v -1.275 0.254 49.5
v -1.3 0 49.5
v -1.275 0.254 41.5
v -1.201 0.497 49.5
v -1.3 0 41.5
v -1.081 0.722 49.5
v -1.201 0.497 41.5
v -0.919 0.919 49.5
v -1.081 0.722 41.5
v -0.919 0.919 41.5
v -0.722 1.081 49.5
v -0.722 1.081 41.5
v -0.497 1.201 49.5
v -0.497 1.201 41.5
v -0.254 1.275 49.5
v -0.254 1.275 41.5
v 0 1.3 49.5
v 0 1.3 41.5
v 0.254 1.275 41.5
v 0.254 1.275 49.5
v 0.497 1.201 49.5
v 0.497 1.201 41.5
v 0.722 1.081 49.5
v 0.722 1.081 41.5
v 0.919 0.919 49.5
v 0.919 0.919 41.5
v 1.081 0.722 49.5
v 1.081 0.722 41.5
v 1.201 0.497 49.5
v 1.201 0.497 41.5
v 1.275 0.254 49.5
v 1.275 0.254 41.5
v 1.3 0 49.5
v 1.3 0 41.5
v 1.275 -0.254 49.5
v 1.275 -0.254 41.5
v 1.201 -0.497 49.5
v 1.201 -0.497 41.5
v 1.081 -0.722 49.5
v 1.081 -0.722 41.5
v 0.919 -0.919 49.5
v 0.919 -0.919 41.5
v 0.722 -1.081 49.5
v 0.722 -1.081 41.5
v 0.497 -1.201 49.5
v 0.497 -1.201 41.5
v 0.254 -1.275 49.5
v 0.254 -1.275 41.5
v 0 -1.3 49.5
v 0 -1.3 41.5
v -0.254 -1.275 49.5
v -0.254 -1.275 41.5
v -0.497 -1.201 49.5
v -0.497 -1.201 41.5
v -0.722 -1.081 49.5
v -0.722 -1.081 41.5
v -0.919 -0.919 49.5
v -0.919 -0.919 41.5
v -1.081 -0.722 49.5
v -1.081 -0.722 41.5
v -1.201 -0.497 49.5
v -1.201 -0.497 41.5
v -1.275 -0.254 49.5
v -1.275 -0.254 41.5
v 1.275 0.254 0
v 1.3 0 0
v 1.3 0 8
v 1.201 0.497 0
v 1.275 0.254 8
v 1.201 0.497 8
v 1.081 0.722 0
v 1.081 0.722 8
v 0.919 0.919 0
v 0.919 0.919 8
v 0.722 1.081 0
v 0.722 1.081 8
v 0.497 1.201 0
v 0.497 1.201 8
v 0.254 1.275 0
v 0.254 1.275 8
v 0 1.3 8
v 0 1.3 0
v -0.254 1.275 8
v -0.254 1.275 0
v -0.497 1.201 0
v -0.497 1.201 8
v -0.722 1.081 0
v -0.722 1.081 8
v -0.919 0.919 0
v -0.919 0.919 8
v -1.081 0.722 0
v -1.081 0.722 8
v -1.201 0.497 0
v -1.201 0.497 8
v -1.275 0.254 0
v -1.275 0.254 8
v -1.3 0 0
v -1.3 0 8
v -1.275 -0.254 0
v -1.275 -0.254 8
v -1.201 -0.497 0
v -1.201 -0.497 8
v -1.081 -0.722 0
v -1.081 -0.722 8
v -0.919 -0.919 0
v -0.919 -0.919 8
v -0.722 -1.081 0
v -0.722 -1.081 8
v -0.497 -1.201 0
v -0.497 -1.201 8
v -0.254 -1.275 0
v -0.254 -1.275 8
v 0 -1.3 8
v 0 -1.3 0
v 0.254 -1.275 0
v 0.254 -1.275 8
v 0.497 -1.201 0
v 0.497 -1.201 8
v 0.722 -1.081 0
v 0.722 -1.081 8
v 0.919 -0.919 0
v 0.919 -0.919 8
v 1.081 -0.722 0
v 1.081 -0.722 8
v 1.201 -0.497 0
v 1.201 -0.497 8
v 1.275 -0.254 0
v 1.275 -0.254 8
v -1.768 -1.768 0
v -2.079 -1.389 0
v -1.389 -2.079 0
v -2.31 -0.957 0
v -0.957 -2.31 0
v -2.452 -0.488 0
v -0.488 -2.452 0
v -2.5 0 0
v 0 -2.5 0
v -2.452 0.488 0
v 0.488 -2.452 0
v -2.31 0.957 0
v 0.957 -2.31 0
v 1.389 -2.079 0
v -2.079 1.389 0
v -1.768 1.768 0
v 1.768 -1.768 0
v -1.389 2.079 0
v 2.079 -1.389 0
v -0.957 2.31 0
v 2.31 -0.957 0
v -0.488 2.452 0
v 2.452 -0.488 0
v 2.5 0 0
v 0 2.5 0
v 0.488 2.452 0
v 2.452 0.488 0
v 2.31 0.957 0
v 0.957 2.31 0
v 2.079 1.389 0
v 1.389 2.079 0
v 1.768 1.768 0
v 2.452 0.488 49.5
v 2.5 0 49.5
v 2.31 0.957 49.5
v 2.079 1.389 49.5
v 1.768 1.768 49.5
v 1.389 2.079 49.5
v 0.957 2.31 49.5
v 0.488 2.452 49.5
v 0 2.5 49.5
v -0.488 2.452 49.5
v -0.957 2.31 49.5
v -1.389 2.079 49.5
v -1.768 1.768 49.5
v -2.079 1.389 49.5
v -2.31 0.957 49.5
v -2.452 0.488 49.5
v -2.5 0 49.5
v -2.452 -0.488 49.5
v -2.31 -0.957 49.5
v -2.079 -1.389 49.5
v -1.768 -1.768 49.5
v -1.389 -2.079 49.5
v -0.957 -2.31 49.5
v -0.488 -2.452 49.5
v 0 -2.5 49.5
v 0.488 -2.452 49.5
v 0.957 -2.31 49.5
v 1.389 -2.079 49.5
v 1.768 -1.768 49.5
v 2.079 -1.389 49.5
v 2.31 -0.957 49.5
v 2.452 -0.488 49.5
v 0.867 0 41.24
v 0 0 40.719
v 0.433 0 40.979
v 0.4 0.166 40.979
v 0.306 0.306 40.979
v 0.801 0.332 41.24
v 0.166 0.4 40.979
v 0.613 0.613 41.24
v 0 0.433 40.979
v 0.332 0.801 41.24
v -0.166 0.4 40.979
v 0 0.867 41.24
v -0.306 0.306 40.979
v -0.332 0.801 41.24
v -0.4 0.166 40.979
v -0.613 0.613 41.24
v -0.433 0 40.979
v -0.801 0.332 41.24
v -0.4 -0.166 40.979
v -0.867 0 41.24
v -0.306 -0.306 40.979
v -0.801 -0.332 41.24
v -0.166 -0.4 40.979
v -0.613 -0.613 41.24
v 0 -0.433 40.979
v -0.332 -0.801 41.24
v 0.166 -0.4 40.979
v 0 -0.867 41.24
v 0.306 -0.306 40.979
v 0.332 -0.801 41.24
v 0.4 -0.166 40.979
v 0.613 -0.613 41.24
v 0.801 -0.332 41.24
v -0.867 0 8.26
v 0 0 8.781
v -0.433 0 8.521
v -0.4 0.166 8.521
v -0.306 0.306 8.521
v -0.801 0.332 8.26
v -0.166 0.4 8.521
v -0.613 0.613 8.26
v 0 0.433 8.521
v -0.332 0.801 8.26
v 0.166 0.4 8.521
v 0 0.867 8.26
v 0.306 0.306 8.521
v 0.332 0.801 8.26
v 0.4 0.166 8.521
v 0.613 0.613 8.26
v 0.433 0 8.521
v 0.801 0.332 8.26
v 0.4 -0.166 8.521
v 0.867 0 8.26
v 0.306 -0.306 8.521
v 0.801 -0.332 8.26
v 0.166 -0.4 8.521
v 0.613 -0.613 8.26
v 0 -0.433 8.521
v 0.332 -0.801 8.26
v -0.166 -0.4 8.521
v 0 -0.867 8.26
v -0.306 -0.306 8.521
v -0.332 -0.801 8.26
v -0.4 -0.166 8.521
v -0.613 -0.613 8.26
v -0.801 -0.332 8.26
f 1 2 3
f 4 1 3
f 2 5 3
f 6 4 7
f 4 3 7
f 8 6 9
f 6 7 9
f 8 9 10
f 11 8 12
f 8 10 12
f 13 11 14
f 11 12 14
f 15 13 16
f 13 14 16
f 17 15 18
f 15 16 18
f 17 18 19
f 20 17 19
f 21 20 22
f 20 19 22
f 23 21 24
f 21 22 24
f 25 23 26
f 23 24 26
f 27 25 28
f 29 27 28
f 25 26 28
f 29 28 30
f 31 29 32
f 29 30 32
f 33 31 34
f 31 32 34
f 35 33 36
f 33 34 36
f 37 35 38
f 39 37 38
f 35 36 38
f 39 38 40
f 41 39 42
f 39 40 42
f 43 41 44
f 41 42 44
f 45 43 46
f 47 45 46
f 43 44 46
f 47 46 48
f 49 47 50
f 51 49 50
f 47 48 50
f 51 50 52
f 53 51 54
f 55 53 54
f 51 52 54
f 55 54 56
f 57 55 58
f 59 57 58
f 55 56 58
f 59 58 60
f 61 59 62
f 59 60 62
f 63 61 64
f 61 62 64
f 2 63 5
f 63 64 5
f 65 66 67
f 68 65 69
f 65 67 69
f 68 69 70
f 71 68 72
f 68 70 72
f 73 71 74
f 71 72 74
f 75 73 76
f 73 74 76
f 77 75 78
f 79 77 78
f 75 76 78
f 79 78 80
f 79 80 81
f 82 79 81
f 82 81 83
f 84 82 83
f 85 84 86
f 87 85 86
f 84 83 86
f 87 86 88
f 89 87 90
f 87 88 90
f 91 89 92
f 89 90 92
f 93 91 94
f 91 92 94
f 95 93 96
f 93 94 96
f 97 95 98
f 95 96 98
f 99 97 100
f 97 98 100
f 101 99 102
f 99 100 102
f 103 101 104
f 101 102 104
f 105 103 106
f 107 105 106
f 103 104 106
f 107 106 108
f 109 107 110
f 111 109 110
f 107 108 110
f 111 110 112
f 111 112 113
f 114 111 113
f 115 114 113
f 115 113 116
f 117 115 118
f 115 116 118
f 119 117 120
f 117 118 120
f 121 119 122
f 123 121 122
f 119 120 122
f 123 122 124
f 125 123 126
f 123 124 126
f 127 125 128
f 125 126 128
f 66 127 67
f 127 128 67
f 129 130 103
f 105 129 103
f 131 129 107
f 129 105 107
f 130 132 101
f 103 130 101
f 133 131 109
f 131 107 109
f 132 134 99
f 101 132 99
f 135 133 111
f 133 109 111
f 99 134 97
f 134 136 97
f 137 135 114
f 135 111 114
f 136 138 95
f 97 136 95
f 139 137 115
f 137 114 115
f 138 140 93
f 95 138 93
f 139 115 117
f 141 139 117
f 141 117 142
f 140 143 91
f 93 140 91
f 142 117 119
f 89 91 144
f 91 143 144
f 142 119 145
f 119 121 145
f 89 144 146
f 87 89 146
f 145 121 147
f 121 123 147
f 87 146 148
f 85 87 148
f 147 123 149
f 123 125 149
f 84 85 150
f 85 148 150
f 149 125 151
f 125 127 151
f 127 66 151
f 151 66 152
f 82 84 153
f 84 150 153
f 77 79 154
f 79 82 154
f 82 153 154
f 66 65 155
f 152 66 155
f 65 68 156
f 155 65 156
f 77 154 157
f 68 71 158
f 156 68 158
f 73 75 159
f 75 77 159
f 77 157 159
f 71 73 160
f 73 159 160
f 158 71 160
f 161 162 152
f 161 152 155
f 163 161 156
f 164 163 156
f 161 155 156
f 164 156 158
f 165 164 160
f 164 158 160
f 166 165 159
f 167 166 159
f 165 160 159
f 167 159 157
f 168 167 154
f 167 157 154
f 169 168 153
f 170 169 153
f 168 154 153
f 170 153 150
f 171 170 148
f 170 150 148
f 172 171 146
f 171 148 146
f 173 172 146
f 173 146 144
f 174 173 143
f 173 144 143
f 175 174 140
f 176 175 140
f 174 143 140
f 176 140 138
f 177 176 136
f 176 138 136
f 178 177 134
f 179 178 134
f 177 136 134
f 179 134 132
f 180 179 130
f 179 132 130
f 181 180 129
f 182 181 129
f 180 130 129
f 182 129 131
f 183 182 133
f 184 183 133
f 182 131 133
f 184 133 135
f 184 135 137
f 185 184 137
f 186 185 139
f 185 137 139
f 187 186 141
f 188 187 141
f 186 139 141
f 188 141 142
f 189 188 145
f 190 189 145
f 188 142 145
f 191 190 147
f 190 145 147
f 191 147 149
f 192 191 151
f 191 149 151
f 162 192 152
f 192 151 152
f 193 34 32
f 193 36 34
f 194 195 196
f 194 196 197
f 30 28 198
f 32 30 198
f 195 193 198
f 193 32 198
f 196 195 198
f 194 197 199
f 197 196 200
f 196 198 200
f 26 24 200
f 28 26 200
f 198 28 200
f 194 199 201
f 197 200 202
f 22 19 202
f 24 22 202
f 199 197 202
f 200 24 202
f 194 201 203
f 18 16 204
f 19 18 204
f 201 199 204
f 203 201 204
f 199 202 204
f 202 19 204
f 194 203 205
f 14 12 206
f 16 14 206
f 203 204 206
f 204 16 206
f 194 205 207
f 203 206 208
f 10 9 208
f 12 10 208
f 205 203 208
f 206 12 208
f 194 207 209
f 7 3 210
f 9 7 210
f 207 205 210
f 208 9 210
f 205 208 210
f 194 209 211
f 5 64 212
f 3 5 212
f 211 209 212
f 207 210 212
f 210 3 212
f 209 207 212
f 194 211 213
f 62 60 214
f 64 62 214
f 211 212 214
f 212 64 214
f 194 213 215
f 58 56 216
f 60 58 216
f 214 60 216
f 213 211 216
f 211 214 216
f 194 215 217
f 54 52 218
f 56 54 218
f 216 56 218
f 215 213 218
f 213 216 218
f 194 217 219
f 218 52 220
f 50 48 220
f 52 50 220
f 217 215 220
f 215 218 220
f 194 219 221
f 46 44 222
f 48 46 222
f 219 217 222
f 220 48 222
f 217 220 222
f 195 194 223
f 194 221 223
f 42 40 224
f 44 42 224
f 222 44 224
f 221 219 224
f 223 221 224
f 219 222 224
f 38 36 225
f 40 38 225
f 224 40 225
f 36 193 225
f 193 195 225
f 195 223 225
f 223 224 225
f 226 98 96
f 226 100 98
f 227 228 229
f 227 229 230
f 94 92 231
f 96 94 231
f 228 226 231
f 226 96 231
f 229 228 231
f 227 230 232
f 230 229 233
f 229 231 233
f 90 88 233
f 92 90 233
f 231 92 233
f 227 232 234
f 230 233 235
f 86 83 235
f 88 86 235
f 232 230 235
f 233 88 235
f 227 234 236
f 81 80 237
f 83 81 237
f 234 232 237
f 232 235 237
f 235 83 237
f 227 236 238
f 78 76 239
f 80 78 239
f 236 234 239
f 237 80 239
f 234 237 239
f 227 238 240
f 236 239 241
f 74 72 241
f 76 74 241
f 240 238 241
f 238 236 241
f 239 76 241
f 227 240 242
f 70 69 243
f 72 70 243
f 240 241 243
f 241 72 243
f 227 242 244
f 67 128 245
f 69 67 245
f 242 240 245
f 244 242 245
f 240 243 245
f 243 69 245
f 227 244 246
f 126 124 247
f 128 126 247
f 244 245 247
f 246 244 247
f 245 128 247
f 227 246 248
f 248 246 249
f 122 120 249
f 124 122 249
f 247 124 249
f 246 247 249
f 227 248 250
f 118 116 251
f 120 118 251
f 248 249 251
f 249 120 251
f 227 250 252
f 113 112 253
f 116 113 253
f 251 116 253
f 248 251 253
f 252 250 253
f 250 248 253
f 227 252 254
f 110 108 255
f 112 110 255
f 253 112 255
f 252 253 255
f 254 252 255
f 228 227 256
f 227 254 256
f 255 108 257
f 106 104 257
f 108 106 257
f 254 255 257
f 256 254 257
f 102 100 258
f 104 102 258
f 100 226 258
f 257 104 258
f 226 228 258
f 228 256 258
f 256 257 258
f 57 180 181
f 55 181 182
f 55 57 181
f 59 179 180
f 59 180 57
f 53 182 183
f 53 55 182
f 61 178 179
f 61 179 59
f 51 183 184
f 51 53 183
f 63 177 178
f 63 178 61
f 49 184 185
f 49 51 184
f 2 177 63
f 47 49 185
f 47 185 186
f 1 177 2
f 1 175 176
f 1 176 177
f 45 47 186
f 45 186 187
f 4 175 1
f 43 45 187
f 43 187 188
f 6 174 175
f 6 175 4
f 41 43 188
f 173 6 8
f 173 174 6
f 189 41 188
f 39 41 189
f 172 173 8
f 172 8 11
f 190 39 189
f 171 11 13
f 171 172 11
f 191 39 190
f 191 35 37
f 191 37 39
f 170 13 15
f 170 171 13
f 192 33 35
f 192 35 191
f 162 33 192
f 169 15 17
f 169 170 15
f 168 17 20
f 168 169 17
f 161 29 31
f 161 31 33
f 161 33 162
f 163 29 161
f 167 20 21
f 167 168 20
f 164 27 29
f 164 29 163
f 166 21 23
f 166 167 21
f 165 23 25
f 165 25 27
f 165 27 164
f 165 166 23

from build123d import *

# Parameters (mm, degrees)
SKETCH1_R                 = 2.5
BOSS_EXTRUDE1_DEPTH       = 49.5
M3X0_5_TAPPED_HOLE1_D     = 2.6
M3X0_5_TAPPED_HOLE1_DEPTH = 8
M3X0_5_TAPPED_HOLE1_TIP   = 0.781118805
M3X0_5_TAPPED_HOLE2_D     = 2.6
M3X0_5_TAPPED_HOLE2_DEPTH = 8
M3X0_5_TAPPED_HOLE2_TIP   = 0.781118805


with BuildPart() as part:
    # Sketch1 → Boss-Extrude1 (new body)
    with BuildSketch(Plane.XY):
        Circle(SKETCH1_R)
    extrude(amount=BOSS_EXTRUDE1_DEPTH)

    # M3x0.5 Tapped Hole1
    with Locations(Plane.XY.offset(49.5)):
        with Locations((0, 0)):
            Hole(M3X0_5_TAPPED_HOLE1_D / 2, depth=M3X0_5_TAPPED_HOLE1_DEPTH)
            with Locations((0, 0, -(M3X0_5_TAPPED_HOLE1_DEPTH + M3X0_5_TAPPED_HOLE1_TIP / 2))):  # 118° drill point
                Cone(0, M3X0_5_TAPPED_HOLE1_D / 2, M3X0_5_TAPPED_HOLE1_TIP, mode=Mode.SUBTRACT)

    # M3x0.5 Tapped Hole2
    with Locations(Plane(origin=(0, 0, 0), x_dir=(-1, 0, 0), z_dir=(0, 0, -1))):
        with Locations((0, 0)):
            Hole(M3X0_5_TAPPED_HOLE2_D / 2, depth=M3X0_5_TAPPED_HOLE2_DEPTH)
            with Locations((0, 0, -(M3X0_5_TAPPED_HOLE2_DEPTH + M3X0_5_TAPPED_HOLE2_TIP / 2))):  # 118° drill point
                Cone(0, M3X0_5_TAPPED_HOLE2_D / 2, M3X0_5_TAPPED_HOLE2_TIP, mode=Mode.SUBTRACT)


solid = part.part
